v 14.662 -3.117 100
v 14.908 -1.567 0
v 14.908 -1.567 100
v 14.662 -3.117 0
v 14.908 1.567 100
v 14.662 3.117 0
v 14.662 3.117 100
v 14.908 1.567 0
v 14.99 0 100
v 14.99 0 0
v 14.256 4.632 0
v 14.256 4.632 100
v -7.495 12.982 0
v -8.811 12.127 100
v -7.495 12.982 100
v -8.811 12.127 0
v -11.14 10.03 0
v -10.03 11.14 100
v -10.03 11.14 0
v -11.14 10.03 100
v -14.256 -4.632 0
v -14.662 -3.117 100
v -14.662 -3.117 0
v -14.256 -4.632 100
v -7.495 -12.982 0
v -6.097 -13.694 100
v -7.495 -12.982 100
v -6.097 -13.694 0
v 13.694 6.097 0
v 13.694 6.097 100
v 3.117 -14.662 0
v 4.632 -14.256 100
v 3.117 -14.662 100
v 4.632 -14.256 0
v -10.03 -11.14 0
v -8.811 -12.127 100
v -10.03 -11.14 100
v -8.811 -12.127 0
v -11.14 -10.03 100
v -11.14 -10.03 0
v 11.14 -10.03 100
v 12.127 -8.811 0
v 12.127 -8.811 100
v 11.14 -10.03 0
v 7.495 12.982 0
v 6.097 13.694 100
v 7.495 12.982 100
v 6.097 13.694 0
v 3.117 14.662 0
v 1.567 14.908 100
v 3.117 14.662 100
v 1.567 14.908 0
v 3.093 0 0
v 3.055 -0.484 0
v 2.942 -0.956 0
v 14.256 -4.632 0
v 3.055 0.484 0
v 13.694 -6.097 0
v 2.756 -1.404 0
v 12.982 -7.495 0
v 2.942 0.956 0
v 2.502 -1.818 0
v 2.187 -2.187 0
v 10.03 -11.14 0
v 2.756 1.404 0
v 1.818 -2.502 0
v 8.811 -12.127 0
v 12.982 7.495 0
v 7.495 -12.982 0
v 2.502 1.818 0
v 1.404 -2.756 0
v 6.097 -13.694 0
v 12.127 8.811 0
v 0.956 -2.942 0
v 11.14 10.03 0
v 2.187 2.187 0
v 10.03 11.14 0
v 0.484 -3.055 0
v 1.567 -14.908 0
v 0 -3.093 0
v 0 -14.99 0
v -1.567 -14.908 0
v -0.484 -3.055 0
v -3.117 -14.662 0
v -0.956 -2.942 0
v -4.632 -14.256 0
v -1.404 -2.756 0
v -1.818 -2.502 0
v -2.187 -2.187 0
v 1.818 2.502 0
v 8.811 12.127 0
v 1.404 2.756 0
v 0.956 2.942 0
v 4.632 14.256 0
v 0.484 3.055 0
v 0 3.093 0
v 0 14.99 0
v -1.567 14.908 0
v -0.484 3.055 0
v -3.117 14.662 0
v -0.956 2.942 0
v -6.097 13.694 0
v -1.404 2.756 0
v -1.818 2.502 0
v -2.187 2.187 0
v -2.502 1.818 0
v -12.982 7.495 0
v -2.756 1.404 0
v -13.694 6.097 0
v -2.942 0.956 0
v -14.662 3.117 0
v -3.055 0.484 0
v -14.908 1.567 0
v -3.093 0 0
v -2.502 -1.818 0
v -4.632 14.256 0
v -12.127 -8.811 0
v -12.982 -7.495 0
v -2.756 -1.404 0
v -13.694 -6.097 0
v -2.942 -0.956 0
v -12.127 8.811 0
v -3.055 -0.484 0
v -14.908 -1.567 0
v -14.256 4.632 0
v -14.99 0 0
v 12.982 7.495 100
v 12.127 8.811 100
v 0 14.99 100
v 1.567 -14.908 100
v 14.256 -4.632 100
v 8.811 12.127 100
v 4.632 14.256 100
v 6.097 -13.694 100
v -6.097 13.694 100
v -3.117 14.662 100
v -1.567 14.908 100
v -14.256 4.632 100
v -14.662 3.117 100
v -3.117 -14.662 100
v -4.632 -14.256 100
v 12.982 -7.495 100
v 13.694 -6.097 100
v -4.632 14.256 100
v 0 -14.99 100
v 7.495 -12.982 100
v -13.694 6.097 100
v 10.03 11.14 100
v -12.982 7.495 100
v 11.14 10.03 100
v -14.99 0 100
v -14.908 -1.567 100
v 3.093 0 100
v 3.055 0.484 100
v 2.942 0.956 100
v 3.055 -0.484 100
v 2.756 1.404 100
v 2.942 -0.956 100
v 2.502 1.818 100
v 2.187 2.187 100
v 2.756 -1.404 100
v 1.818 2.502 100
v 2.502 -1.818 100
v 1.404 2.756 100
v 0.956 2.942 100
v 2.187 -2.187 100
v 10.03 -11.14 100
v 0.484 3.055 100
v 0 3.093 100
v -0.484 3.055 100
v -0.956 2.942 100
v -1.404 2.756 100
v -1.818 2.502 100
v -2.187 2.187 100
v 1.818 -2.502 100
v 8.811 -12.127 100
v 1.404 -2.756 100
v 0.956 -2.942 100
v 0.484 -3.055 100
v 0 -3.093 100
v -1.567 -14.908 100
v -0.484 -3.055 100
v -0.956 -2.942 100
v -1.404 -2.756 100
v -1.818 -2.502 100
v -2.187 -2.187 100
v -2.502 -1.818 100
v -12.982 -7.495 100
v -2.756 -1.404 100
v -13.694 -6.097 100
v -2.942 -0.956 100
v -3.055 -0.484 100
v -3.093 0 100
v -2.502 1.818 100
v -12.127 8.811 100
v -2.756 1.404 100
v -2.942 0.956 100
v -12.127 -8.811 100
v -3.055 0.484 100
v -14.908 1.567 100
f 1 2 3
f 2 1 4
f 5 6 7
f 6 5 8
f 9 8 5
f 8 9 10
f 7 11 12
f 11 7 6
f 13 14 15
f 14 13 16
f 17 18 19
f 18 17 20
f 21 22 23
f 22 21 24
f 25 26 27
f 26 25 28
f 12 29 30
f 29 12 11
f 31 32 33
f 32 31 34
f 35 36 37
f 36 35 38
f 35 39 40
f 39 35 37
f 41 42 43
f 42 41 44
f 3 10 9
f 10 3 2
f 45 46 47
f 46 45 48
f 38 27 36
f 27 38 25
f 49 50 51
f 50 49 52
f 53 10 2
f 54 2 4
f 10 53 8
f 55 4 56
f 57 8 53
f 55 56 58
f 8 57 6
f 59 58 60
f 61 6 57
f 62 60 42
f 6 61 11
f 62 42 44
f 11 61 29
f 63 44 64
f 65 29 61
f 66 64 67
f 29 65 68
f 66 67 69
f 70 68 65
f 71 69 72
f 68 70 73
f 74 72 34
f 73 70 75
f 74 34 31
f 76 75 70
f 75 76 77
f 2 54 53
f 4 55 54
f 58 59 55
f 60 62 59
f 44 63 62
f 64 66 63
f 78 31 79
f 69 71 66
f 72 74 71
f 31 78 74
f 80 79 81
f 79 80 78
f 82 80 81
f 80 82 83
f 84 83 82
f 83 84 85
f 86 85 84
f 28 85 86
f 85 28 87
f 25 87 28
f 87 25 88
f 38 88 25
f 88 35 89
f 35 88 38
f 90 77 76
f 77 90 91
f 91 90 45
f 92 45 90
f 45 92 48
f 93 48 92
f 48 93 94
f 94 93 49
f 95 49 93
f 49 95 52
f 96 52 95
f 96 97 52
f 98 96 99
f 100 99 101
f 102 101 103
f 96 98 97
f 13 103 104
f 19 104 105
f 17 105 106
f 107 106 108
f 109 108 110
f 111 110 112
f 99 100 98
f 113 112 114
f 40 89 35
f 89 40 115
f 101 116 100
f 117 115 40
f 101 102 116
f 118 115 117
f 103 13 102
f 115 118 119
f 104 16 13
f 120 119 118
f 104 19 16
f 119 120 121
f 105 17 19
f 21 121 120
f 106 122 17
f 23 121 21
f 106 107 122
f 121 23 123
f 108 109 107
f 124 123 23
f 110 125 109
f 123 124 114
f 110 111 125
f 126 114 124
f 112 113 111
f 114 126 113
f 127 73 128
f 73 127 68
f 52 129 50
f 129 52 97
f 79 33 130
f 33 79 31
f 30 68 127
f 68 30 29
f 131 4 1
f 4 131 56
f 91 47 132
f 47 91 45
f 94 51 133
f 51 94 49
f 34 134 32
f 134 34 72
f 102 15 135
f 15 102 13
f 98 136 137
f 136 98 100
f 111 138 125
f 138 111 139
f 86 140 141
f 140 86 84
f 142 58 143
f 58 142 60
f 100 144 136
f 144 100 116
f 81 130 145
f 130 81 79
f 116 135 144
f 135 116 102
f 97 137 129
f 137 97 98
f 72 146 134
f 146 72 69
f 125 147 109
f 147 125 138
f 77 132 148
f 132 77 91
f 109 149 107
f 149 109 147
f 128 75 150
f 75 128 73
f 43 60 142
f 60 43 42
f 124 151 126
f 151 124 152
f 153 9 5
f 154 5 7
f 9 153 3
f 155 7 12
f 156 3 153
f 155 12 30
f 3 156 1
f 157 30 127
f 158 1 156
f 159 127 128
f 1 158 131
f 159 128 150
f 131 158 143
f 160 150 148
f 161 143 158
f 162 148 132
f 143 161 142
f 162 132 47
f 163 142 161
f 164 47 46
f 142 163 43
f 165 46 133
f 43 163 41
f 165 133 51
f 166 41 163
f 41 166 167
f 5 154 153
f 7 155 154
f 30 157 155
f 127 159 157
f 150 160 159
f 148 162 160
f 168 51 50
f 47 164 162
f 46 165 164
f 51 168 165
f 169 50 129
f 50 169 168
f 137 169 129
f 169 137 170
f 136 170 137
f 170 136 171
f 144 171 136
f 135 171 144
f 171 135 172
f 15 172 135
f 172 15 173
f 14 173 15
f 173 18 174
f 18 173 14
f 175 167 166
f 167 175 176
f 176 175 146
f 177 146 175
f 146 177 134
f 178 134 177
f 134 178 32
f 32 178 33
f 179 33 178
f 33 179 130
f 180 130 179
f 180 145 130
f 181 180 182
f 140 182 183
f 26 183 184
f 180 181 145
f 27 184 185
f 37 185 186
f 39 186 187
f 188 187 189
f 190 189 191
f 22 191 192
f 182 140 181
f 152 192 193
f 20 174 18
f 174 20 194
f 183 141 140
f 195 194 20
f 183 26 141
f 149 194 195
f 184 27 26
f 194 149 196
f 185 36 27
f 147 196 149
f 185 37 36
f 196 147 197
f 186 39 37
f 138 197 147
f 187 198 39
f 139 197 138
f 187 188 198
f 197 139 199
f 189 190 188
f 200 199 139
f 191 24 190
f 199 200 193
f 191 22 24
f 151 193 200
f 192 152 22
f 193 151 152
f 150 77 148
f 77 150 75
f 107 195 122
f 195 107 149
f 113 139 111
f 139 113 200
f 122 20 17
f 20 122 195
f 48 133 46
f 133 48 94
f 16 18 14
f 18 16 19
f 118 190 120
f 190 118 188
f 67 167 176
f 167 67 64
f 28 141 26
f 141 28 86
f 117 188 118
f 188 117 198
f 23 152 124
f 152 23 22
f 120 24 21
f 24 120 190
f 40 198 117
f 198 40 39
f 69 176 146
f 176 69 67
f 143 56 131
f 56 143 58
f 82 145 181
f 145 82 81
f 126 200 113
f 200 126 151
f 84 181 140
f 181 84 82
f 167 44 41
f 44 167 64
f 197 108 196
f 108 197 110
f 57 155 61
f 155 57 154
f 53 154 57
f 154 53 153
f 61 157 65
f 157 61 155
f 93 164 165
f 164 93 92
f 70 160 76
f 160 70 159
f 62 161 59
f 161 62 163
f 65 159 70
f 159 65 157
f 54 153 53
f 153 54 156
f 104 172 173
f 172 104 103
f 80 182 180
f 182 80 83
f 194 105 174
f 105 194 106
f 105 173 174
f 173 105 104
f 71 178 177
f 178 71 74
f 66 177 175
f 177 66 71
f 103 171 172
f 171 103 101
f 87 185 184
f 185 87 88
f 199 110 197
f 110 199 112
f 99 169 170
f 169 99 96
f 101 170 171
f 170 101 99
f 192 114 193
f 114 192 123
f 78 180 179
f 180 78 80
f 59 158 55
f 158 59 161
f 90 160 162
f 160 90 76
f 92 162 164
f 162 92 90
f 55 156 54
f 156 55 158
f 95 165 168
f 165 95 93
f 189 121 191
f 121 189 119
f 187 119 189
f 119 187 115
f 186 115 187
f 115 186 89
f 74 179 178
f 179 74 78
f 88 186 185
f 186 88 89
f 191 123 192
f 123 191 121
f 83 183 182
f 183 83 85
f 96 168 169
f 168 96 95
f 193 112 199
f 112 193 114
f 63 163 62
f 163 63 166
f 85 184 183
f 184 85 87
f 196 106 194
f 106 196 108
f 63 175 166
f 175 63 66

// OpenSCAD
        wall_thickness = 2.62;
        bore_clearance = 1.093;
        roller_radius = 14.99;

        module roller() {
            difference() {
                cylinder(h=100, r=roller_radius, $fn=60);
                translate([0,0,-5])
                    cylinder(h=110, r=bore_clearance + 2, $fn=40);
            }
        }
        roller();
        
